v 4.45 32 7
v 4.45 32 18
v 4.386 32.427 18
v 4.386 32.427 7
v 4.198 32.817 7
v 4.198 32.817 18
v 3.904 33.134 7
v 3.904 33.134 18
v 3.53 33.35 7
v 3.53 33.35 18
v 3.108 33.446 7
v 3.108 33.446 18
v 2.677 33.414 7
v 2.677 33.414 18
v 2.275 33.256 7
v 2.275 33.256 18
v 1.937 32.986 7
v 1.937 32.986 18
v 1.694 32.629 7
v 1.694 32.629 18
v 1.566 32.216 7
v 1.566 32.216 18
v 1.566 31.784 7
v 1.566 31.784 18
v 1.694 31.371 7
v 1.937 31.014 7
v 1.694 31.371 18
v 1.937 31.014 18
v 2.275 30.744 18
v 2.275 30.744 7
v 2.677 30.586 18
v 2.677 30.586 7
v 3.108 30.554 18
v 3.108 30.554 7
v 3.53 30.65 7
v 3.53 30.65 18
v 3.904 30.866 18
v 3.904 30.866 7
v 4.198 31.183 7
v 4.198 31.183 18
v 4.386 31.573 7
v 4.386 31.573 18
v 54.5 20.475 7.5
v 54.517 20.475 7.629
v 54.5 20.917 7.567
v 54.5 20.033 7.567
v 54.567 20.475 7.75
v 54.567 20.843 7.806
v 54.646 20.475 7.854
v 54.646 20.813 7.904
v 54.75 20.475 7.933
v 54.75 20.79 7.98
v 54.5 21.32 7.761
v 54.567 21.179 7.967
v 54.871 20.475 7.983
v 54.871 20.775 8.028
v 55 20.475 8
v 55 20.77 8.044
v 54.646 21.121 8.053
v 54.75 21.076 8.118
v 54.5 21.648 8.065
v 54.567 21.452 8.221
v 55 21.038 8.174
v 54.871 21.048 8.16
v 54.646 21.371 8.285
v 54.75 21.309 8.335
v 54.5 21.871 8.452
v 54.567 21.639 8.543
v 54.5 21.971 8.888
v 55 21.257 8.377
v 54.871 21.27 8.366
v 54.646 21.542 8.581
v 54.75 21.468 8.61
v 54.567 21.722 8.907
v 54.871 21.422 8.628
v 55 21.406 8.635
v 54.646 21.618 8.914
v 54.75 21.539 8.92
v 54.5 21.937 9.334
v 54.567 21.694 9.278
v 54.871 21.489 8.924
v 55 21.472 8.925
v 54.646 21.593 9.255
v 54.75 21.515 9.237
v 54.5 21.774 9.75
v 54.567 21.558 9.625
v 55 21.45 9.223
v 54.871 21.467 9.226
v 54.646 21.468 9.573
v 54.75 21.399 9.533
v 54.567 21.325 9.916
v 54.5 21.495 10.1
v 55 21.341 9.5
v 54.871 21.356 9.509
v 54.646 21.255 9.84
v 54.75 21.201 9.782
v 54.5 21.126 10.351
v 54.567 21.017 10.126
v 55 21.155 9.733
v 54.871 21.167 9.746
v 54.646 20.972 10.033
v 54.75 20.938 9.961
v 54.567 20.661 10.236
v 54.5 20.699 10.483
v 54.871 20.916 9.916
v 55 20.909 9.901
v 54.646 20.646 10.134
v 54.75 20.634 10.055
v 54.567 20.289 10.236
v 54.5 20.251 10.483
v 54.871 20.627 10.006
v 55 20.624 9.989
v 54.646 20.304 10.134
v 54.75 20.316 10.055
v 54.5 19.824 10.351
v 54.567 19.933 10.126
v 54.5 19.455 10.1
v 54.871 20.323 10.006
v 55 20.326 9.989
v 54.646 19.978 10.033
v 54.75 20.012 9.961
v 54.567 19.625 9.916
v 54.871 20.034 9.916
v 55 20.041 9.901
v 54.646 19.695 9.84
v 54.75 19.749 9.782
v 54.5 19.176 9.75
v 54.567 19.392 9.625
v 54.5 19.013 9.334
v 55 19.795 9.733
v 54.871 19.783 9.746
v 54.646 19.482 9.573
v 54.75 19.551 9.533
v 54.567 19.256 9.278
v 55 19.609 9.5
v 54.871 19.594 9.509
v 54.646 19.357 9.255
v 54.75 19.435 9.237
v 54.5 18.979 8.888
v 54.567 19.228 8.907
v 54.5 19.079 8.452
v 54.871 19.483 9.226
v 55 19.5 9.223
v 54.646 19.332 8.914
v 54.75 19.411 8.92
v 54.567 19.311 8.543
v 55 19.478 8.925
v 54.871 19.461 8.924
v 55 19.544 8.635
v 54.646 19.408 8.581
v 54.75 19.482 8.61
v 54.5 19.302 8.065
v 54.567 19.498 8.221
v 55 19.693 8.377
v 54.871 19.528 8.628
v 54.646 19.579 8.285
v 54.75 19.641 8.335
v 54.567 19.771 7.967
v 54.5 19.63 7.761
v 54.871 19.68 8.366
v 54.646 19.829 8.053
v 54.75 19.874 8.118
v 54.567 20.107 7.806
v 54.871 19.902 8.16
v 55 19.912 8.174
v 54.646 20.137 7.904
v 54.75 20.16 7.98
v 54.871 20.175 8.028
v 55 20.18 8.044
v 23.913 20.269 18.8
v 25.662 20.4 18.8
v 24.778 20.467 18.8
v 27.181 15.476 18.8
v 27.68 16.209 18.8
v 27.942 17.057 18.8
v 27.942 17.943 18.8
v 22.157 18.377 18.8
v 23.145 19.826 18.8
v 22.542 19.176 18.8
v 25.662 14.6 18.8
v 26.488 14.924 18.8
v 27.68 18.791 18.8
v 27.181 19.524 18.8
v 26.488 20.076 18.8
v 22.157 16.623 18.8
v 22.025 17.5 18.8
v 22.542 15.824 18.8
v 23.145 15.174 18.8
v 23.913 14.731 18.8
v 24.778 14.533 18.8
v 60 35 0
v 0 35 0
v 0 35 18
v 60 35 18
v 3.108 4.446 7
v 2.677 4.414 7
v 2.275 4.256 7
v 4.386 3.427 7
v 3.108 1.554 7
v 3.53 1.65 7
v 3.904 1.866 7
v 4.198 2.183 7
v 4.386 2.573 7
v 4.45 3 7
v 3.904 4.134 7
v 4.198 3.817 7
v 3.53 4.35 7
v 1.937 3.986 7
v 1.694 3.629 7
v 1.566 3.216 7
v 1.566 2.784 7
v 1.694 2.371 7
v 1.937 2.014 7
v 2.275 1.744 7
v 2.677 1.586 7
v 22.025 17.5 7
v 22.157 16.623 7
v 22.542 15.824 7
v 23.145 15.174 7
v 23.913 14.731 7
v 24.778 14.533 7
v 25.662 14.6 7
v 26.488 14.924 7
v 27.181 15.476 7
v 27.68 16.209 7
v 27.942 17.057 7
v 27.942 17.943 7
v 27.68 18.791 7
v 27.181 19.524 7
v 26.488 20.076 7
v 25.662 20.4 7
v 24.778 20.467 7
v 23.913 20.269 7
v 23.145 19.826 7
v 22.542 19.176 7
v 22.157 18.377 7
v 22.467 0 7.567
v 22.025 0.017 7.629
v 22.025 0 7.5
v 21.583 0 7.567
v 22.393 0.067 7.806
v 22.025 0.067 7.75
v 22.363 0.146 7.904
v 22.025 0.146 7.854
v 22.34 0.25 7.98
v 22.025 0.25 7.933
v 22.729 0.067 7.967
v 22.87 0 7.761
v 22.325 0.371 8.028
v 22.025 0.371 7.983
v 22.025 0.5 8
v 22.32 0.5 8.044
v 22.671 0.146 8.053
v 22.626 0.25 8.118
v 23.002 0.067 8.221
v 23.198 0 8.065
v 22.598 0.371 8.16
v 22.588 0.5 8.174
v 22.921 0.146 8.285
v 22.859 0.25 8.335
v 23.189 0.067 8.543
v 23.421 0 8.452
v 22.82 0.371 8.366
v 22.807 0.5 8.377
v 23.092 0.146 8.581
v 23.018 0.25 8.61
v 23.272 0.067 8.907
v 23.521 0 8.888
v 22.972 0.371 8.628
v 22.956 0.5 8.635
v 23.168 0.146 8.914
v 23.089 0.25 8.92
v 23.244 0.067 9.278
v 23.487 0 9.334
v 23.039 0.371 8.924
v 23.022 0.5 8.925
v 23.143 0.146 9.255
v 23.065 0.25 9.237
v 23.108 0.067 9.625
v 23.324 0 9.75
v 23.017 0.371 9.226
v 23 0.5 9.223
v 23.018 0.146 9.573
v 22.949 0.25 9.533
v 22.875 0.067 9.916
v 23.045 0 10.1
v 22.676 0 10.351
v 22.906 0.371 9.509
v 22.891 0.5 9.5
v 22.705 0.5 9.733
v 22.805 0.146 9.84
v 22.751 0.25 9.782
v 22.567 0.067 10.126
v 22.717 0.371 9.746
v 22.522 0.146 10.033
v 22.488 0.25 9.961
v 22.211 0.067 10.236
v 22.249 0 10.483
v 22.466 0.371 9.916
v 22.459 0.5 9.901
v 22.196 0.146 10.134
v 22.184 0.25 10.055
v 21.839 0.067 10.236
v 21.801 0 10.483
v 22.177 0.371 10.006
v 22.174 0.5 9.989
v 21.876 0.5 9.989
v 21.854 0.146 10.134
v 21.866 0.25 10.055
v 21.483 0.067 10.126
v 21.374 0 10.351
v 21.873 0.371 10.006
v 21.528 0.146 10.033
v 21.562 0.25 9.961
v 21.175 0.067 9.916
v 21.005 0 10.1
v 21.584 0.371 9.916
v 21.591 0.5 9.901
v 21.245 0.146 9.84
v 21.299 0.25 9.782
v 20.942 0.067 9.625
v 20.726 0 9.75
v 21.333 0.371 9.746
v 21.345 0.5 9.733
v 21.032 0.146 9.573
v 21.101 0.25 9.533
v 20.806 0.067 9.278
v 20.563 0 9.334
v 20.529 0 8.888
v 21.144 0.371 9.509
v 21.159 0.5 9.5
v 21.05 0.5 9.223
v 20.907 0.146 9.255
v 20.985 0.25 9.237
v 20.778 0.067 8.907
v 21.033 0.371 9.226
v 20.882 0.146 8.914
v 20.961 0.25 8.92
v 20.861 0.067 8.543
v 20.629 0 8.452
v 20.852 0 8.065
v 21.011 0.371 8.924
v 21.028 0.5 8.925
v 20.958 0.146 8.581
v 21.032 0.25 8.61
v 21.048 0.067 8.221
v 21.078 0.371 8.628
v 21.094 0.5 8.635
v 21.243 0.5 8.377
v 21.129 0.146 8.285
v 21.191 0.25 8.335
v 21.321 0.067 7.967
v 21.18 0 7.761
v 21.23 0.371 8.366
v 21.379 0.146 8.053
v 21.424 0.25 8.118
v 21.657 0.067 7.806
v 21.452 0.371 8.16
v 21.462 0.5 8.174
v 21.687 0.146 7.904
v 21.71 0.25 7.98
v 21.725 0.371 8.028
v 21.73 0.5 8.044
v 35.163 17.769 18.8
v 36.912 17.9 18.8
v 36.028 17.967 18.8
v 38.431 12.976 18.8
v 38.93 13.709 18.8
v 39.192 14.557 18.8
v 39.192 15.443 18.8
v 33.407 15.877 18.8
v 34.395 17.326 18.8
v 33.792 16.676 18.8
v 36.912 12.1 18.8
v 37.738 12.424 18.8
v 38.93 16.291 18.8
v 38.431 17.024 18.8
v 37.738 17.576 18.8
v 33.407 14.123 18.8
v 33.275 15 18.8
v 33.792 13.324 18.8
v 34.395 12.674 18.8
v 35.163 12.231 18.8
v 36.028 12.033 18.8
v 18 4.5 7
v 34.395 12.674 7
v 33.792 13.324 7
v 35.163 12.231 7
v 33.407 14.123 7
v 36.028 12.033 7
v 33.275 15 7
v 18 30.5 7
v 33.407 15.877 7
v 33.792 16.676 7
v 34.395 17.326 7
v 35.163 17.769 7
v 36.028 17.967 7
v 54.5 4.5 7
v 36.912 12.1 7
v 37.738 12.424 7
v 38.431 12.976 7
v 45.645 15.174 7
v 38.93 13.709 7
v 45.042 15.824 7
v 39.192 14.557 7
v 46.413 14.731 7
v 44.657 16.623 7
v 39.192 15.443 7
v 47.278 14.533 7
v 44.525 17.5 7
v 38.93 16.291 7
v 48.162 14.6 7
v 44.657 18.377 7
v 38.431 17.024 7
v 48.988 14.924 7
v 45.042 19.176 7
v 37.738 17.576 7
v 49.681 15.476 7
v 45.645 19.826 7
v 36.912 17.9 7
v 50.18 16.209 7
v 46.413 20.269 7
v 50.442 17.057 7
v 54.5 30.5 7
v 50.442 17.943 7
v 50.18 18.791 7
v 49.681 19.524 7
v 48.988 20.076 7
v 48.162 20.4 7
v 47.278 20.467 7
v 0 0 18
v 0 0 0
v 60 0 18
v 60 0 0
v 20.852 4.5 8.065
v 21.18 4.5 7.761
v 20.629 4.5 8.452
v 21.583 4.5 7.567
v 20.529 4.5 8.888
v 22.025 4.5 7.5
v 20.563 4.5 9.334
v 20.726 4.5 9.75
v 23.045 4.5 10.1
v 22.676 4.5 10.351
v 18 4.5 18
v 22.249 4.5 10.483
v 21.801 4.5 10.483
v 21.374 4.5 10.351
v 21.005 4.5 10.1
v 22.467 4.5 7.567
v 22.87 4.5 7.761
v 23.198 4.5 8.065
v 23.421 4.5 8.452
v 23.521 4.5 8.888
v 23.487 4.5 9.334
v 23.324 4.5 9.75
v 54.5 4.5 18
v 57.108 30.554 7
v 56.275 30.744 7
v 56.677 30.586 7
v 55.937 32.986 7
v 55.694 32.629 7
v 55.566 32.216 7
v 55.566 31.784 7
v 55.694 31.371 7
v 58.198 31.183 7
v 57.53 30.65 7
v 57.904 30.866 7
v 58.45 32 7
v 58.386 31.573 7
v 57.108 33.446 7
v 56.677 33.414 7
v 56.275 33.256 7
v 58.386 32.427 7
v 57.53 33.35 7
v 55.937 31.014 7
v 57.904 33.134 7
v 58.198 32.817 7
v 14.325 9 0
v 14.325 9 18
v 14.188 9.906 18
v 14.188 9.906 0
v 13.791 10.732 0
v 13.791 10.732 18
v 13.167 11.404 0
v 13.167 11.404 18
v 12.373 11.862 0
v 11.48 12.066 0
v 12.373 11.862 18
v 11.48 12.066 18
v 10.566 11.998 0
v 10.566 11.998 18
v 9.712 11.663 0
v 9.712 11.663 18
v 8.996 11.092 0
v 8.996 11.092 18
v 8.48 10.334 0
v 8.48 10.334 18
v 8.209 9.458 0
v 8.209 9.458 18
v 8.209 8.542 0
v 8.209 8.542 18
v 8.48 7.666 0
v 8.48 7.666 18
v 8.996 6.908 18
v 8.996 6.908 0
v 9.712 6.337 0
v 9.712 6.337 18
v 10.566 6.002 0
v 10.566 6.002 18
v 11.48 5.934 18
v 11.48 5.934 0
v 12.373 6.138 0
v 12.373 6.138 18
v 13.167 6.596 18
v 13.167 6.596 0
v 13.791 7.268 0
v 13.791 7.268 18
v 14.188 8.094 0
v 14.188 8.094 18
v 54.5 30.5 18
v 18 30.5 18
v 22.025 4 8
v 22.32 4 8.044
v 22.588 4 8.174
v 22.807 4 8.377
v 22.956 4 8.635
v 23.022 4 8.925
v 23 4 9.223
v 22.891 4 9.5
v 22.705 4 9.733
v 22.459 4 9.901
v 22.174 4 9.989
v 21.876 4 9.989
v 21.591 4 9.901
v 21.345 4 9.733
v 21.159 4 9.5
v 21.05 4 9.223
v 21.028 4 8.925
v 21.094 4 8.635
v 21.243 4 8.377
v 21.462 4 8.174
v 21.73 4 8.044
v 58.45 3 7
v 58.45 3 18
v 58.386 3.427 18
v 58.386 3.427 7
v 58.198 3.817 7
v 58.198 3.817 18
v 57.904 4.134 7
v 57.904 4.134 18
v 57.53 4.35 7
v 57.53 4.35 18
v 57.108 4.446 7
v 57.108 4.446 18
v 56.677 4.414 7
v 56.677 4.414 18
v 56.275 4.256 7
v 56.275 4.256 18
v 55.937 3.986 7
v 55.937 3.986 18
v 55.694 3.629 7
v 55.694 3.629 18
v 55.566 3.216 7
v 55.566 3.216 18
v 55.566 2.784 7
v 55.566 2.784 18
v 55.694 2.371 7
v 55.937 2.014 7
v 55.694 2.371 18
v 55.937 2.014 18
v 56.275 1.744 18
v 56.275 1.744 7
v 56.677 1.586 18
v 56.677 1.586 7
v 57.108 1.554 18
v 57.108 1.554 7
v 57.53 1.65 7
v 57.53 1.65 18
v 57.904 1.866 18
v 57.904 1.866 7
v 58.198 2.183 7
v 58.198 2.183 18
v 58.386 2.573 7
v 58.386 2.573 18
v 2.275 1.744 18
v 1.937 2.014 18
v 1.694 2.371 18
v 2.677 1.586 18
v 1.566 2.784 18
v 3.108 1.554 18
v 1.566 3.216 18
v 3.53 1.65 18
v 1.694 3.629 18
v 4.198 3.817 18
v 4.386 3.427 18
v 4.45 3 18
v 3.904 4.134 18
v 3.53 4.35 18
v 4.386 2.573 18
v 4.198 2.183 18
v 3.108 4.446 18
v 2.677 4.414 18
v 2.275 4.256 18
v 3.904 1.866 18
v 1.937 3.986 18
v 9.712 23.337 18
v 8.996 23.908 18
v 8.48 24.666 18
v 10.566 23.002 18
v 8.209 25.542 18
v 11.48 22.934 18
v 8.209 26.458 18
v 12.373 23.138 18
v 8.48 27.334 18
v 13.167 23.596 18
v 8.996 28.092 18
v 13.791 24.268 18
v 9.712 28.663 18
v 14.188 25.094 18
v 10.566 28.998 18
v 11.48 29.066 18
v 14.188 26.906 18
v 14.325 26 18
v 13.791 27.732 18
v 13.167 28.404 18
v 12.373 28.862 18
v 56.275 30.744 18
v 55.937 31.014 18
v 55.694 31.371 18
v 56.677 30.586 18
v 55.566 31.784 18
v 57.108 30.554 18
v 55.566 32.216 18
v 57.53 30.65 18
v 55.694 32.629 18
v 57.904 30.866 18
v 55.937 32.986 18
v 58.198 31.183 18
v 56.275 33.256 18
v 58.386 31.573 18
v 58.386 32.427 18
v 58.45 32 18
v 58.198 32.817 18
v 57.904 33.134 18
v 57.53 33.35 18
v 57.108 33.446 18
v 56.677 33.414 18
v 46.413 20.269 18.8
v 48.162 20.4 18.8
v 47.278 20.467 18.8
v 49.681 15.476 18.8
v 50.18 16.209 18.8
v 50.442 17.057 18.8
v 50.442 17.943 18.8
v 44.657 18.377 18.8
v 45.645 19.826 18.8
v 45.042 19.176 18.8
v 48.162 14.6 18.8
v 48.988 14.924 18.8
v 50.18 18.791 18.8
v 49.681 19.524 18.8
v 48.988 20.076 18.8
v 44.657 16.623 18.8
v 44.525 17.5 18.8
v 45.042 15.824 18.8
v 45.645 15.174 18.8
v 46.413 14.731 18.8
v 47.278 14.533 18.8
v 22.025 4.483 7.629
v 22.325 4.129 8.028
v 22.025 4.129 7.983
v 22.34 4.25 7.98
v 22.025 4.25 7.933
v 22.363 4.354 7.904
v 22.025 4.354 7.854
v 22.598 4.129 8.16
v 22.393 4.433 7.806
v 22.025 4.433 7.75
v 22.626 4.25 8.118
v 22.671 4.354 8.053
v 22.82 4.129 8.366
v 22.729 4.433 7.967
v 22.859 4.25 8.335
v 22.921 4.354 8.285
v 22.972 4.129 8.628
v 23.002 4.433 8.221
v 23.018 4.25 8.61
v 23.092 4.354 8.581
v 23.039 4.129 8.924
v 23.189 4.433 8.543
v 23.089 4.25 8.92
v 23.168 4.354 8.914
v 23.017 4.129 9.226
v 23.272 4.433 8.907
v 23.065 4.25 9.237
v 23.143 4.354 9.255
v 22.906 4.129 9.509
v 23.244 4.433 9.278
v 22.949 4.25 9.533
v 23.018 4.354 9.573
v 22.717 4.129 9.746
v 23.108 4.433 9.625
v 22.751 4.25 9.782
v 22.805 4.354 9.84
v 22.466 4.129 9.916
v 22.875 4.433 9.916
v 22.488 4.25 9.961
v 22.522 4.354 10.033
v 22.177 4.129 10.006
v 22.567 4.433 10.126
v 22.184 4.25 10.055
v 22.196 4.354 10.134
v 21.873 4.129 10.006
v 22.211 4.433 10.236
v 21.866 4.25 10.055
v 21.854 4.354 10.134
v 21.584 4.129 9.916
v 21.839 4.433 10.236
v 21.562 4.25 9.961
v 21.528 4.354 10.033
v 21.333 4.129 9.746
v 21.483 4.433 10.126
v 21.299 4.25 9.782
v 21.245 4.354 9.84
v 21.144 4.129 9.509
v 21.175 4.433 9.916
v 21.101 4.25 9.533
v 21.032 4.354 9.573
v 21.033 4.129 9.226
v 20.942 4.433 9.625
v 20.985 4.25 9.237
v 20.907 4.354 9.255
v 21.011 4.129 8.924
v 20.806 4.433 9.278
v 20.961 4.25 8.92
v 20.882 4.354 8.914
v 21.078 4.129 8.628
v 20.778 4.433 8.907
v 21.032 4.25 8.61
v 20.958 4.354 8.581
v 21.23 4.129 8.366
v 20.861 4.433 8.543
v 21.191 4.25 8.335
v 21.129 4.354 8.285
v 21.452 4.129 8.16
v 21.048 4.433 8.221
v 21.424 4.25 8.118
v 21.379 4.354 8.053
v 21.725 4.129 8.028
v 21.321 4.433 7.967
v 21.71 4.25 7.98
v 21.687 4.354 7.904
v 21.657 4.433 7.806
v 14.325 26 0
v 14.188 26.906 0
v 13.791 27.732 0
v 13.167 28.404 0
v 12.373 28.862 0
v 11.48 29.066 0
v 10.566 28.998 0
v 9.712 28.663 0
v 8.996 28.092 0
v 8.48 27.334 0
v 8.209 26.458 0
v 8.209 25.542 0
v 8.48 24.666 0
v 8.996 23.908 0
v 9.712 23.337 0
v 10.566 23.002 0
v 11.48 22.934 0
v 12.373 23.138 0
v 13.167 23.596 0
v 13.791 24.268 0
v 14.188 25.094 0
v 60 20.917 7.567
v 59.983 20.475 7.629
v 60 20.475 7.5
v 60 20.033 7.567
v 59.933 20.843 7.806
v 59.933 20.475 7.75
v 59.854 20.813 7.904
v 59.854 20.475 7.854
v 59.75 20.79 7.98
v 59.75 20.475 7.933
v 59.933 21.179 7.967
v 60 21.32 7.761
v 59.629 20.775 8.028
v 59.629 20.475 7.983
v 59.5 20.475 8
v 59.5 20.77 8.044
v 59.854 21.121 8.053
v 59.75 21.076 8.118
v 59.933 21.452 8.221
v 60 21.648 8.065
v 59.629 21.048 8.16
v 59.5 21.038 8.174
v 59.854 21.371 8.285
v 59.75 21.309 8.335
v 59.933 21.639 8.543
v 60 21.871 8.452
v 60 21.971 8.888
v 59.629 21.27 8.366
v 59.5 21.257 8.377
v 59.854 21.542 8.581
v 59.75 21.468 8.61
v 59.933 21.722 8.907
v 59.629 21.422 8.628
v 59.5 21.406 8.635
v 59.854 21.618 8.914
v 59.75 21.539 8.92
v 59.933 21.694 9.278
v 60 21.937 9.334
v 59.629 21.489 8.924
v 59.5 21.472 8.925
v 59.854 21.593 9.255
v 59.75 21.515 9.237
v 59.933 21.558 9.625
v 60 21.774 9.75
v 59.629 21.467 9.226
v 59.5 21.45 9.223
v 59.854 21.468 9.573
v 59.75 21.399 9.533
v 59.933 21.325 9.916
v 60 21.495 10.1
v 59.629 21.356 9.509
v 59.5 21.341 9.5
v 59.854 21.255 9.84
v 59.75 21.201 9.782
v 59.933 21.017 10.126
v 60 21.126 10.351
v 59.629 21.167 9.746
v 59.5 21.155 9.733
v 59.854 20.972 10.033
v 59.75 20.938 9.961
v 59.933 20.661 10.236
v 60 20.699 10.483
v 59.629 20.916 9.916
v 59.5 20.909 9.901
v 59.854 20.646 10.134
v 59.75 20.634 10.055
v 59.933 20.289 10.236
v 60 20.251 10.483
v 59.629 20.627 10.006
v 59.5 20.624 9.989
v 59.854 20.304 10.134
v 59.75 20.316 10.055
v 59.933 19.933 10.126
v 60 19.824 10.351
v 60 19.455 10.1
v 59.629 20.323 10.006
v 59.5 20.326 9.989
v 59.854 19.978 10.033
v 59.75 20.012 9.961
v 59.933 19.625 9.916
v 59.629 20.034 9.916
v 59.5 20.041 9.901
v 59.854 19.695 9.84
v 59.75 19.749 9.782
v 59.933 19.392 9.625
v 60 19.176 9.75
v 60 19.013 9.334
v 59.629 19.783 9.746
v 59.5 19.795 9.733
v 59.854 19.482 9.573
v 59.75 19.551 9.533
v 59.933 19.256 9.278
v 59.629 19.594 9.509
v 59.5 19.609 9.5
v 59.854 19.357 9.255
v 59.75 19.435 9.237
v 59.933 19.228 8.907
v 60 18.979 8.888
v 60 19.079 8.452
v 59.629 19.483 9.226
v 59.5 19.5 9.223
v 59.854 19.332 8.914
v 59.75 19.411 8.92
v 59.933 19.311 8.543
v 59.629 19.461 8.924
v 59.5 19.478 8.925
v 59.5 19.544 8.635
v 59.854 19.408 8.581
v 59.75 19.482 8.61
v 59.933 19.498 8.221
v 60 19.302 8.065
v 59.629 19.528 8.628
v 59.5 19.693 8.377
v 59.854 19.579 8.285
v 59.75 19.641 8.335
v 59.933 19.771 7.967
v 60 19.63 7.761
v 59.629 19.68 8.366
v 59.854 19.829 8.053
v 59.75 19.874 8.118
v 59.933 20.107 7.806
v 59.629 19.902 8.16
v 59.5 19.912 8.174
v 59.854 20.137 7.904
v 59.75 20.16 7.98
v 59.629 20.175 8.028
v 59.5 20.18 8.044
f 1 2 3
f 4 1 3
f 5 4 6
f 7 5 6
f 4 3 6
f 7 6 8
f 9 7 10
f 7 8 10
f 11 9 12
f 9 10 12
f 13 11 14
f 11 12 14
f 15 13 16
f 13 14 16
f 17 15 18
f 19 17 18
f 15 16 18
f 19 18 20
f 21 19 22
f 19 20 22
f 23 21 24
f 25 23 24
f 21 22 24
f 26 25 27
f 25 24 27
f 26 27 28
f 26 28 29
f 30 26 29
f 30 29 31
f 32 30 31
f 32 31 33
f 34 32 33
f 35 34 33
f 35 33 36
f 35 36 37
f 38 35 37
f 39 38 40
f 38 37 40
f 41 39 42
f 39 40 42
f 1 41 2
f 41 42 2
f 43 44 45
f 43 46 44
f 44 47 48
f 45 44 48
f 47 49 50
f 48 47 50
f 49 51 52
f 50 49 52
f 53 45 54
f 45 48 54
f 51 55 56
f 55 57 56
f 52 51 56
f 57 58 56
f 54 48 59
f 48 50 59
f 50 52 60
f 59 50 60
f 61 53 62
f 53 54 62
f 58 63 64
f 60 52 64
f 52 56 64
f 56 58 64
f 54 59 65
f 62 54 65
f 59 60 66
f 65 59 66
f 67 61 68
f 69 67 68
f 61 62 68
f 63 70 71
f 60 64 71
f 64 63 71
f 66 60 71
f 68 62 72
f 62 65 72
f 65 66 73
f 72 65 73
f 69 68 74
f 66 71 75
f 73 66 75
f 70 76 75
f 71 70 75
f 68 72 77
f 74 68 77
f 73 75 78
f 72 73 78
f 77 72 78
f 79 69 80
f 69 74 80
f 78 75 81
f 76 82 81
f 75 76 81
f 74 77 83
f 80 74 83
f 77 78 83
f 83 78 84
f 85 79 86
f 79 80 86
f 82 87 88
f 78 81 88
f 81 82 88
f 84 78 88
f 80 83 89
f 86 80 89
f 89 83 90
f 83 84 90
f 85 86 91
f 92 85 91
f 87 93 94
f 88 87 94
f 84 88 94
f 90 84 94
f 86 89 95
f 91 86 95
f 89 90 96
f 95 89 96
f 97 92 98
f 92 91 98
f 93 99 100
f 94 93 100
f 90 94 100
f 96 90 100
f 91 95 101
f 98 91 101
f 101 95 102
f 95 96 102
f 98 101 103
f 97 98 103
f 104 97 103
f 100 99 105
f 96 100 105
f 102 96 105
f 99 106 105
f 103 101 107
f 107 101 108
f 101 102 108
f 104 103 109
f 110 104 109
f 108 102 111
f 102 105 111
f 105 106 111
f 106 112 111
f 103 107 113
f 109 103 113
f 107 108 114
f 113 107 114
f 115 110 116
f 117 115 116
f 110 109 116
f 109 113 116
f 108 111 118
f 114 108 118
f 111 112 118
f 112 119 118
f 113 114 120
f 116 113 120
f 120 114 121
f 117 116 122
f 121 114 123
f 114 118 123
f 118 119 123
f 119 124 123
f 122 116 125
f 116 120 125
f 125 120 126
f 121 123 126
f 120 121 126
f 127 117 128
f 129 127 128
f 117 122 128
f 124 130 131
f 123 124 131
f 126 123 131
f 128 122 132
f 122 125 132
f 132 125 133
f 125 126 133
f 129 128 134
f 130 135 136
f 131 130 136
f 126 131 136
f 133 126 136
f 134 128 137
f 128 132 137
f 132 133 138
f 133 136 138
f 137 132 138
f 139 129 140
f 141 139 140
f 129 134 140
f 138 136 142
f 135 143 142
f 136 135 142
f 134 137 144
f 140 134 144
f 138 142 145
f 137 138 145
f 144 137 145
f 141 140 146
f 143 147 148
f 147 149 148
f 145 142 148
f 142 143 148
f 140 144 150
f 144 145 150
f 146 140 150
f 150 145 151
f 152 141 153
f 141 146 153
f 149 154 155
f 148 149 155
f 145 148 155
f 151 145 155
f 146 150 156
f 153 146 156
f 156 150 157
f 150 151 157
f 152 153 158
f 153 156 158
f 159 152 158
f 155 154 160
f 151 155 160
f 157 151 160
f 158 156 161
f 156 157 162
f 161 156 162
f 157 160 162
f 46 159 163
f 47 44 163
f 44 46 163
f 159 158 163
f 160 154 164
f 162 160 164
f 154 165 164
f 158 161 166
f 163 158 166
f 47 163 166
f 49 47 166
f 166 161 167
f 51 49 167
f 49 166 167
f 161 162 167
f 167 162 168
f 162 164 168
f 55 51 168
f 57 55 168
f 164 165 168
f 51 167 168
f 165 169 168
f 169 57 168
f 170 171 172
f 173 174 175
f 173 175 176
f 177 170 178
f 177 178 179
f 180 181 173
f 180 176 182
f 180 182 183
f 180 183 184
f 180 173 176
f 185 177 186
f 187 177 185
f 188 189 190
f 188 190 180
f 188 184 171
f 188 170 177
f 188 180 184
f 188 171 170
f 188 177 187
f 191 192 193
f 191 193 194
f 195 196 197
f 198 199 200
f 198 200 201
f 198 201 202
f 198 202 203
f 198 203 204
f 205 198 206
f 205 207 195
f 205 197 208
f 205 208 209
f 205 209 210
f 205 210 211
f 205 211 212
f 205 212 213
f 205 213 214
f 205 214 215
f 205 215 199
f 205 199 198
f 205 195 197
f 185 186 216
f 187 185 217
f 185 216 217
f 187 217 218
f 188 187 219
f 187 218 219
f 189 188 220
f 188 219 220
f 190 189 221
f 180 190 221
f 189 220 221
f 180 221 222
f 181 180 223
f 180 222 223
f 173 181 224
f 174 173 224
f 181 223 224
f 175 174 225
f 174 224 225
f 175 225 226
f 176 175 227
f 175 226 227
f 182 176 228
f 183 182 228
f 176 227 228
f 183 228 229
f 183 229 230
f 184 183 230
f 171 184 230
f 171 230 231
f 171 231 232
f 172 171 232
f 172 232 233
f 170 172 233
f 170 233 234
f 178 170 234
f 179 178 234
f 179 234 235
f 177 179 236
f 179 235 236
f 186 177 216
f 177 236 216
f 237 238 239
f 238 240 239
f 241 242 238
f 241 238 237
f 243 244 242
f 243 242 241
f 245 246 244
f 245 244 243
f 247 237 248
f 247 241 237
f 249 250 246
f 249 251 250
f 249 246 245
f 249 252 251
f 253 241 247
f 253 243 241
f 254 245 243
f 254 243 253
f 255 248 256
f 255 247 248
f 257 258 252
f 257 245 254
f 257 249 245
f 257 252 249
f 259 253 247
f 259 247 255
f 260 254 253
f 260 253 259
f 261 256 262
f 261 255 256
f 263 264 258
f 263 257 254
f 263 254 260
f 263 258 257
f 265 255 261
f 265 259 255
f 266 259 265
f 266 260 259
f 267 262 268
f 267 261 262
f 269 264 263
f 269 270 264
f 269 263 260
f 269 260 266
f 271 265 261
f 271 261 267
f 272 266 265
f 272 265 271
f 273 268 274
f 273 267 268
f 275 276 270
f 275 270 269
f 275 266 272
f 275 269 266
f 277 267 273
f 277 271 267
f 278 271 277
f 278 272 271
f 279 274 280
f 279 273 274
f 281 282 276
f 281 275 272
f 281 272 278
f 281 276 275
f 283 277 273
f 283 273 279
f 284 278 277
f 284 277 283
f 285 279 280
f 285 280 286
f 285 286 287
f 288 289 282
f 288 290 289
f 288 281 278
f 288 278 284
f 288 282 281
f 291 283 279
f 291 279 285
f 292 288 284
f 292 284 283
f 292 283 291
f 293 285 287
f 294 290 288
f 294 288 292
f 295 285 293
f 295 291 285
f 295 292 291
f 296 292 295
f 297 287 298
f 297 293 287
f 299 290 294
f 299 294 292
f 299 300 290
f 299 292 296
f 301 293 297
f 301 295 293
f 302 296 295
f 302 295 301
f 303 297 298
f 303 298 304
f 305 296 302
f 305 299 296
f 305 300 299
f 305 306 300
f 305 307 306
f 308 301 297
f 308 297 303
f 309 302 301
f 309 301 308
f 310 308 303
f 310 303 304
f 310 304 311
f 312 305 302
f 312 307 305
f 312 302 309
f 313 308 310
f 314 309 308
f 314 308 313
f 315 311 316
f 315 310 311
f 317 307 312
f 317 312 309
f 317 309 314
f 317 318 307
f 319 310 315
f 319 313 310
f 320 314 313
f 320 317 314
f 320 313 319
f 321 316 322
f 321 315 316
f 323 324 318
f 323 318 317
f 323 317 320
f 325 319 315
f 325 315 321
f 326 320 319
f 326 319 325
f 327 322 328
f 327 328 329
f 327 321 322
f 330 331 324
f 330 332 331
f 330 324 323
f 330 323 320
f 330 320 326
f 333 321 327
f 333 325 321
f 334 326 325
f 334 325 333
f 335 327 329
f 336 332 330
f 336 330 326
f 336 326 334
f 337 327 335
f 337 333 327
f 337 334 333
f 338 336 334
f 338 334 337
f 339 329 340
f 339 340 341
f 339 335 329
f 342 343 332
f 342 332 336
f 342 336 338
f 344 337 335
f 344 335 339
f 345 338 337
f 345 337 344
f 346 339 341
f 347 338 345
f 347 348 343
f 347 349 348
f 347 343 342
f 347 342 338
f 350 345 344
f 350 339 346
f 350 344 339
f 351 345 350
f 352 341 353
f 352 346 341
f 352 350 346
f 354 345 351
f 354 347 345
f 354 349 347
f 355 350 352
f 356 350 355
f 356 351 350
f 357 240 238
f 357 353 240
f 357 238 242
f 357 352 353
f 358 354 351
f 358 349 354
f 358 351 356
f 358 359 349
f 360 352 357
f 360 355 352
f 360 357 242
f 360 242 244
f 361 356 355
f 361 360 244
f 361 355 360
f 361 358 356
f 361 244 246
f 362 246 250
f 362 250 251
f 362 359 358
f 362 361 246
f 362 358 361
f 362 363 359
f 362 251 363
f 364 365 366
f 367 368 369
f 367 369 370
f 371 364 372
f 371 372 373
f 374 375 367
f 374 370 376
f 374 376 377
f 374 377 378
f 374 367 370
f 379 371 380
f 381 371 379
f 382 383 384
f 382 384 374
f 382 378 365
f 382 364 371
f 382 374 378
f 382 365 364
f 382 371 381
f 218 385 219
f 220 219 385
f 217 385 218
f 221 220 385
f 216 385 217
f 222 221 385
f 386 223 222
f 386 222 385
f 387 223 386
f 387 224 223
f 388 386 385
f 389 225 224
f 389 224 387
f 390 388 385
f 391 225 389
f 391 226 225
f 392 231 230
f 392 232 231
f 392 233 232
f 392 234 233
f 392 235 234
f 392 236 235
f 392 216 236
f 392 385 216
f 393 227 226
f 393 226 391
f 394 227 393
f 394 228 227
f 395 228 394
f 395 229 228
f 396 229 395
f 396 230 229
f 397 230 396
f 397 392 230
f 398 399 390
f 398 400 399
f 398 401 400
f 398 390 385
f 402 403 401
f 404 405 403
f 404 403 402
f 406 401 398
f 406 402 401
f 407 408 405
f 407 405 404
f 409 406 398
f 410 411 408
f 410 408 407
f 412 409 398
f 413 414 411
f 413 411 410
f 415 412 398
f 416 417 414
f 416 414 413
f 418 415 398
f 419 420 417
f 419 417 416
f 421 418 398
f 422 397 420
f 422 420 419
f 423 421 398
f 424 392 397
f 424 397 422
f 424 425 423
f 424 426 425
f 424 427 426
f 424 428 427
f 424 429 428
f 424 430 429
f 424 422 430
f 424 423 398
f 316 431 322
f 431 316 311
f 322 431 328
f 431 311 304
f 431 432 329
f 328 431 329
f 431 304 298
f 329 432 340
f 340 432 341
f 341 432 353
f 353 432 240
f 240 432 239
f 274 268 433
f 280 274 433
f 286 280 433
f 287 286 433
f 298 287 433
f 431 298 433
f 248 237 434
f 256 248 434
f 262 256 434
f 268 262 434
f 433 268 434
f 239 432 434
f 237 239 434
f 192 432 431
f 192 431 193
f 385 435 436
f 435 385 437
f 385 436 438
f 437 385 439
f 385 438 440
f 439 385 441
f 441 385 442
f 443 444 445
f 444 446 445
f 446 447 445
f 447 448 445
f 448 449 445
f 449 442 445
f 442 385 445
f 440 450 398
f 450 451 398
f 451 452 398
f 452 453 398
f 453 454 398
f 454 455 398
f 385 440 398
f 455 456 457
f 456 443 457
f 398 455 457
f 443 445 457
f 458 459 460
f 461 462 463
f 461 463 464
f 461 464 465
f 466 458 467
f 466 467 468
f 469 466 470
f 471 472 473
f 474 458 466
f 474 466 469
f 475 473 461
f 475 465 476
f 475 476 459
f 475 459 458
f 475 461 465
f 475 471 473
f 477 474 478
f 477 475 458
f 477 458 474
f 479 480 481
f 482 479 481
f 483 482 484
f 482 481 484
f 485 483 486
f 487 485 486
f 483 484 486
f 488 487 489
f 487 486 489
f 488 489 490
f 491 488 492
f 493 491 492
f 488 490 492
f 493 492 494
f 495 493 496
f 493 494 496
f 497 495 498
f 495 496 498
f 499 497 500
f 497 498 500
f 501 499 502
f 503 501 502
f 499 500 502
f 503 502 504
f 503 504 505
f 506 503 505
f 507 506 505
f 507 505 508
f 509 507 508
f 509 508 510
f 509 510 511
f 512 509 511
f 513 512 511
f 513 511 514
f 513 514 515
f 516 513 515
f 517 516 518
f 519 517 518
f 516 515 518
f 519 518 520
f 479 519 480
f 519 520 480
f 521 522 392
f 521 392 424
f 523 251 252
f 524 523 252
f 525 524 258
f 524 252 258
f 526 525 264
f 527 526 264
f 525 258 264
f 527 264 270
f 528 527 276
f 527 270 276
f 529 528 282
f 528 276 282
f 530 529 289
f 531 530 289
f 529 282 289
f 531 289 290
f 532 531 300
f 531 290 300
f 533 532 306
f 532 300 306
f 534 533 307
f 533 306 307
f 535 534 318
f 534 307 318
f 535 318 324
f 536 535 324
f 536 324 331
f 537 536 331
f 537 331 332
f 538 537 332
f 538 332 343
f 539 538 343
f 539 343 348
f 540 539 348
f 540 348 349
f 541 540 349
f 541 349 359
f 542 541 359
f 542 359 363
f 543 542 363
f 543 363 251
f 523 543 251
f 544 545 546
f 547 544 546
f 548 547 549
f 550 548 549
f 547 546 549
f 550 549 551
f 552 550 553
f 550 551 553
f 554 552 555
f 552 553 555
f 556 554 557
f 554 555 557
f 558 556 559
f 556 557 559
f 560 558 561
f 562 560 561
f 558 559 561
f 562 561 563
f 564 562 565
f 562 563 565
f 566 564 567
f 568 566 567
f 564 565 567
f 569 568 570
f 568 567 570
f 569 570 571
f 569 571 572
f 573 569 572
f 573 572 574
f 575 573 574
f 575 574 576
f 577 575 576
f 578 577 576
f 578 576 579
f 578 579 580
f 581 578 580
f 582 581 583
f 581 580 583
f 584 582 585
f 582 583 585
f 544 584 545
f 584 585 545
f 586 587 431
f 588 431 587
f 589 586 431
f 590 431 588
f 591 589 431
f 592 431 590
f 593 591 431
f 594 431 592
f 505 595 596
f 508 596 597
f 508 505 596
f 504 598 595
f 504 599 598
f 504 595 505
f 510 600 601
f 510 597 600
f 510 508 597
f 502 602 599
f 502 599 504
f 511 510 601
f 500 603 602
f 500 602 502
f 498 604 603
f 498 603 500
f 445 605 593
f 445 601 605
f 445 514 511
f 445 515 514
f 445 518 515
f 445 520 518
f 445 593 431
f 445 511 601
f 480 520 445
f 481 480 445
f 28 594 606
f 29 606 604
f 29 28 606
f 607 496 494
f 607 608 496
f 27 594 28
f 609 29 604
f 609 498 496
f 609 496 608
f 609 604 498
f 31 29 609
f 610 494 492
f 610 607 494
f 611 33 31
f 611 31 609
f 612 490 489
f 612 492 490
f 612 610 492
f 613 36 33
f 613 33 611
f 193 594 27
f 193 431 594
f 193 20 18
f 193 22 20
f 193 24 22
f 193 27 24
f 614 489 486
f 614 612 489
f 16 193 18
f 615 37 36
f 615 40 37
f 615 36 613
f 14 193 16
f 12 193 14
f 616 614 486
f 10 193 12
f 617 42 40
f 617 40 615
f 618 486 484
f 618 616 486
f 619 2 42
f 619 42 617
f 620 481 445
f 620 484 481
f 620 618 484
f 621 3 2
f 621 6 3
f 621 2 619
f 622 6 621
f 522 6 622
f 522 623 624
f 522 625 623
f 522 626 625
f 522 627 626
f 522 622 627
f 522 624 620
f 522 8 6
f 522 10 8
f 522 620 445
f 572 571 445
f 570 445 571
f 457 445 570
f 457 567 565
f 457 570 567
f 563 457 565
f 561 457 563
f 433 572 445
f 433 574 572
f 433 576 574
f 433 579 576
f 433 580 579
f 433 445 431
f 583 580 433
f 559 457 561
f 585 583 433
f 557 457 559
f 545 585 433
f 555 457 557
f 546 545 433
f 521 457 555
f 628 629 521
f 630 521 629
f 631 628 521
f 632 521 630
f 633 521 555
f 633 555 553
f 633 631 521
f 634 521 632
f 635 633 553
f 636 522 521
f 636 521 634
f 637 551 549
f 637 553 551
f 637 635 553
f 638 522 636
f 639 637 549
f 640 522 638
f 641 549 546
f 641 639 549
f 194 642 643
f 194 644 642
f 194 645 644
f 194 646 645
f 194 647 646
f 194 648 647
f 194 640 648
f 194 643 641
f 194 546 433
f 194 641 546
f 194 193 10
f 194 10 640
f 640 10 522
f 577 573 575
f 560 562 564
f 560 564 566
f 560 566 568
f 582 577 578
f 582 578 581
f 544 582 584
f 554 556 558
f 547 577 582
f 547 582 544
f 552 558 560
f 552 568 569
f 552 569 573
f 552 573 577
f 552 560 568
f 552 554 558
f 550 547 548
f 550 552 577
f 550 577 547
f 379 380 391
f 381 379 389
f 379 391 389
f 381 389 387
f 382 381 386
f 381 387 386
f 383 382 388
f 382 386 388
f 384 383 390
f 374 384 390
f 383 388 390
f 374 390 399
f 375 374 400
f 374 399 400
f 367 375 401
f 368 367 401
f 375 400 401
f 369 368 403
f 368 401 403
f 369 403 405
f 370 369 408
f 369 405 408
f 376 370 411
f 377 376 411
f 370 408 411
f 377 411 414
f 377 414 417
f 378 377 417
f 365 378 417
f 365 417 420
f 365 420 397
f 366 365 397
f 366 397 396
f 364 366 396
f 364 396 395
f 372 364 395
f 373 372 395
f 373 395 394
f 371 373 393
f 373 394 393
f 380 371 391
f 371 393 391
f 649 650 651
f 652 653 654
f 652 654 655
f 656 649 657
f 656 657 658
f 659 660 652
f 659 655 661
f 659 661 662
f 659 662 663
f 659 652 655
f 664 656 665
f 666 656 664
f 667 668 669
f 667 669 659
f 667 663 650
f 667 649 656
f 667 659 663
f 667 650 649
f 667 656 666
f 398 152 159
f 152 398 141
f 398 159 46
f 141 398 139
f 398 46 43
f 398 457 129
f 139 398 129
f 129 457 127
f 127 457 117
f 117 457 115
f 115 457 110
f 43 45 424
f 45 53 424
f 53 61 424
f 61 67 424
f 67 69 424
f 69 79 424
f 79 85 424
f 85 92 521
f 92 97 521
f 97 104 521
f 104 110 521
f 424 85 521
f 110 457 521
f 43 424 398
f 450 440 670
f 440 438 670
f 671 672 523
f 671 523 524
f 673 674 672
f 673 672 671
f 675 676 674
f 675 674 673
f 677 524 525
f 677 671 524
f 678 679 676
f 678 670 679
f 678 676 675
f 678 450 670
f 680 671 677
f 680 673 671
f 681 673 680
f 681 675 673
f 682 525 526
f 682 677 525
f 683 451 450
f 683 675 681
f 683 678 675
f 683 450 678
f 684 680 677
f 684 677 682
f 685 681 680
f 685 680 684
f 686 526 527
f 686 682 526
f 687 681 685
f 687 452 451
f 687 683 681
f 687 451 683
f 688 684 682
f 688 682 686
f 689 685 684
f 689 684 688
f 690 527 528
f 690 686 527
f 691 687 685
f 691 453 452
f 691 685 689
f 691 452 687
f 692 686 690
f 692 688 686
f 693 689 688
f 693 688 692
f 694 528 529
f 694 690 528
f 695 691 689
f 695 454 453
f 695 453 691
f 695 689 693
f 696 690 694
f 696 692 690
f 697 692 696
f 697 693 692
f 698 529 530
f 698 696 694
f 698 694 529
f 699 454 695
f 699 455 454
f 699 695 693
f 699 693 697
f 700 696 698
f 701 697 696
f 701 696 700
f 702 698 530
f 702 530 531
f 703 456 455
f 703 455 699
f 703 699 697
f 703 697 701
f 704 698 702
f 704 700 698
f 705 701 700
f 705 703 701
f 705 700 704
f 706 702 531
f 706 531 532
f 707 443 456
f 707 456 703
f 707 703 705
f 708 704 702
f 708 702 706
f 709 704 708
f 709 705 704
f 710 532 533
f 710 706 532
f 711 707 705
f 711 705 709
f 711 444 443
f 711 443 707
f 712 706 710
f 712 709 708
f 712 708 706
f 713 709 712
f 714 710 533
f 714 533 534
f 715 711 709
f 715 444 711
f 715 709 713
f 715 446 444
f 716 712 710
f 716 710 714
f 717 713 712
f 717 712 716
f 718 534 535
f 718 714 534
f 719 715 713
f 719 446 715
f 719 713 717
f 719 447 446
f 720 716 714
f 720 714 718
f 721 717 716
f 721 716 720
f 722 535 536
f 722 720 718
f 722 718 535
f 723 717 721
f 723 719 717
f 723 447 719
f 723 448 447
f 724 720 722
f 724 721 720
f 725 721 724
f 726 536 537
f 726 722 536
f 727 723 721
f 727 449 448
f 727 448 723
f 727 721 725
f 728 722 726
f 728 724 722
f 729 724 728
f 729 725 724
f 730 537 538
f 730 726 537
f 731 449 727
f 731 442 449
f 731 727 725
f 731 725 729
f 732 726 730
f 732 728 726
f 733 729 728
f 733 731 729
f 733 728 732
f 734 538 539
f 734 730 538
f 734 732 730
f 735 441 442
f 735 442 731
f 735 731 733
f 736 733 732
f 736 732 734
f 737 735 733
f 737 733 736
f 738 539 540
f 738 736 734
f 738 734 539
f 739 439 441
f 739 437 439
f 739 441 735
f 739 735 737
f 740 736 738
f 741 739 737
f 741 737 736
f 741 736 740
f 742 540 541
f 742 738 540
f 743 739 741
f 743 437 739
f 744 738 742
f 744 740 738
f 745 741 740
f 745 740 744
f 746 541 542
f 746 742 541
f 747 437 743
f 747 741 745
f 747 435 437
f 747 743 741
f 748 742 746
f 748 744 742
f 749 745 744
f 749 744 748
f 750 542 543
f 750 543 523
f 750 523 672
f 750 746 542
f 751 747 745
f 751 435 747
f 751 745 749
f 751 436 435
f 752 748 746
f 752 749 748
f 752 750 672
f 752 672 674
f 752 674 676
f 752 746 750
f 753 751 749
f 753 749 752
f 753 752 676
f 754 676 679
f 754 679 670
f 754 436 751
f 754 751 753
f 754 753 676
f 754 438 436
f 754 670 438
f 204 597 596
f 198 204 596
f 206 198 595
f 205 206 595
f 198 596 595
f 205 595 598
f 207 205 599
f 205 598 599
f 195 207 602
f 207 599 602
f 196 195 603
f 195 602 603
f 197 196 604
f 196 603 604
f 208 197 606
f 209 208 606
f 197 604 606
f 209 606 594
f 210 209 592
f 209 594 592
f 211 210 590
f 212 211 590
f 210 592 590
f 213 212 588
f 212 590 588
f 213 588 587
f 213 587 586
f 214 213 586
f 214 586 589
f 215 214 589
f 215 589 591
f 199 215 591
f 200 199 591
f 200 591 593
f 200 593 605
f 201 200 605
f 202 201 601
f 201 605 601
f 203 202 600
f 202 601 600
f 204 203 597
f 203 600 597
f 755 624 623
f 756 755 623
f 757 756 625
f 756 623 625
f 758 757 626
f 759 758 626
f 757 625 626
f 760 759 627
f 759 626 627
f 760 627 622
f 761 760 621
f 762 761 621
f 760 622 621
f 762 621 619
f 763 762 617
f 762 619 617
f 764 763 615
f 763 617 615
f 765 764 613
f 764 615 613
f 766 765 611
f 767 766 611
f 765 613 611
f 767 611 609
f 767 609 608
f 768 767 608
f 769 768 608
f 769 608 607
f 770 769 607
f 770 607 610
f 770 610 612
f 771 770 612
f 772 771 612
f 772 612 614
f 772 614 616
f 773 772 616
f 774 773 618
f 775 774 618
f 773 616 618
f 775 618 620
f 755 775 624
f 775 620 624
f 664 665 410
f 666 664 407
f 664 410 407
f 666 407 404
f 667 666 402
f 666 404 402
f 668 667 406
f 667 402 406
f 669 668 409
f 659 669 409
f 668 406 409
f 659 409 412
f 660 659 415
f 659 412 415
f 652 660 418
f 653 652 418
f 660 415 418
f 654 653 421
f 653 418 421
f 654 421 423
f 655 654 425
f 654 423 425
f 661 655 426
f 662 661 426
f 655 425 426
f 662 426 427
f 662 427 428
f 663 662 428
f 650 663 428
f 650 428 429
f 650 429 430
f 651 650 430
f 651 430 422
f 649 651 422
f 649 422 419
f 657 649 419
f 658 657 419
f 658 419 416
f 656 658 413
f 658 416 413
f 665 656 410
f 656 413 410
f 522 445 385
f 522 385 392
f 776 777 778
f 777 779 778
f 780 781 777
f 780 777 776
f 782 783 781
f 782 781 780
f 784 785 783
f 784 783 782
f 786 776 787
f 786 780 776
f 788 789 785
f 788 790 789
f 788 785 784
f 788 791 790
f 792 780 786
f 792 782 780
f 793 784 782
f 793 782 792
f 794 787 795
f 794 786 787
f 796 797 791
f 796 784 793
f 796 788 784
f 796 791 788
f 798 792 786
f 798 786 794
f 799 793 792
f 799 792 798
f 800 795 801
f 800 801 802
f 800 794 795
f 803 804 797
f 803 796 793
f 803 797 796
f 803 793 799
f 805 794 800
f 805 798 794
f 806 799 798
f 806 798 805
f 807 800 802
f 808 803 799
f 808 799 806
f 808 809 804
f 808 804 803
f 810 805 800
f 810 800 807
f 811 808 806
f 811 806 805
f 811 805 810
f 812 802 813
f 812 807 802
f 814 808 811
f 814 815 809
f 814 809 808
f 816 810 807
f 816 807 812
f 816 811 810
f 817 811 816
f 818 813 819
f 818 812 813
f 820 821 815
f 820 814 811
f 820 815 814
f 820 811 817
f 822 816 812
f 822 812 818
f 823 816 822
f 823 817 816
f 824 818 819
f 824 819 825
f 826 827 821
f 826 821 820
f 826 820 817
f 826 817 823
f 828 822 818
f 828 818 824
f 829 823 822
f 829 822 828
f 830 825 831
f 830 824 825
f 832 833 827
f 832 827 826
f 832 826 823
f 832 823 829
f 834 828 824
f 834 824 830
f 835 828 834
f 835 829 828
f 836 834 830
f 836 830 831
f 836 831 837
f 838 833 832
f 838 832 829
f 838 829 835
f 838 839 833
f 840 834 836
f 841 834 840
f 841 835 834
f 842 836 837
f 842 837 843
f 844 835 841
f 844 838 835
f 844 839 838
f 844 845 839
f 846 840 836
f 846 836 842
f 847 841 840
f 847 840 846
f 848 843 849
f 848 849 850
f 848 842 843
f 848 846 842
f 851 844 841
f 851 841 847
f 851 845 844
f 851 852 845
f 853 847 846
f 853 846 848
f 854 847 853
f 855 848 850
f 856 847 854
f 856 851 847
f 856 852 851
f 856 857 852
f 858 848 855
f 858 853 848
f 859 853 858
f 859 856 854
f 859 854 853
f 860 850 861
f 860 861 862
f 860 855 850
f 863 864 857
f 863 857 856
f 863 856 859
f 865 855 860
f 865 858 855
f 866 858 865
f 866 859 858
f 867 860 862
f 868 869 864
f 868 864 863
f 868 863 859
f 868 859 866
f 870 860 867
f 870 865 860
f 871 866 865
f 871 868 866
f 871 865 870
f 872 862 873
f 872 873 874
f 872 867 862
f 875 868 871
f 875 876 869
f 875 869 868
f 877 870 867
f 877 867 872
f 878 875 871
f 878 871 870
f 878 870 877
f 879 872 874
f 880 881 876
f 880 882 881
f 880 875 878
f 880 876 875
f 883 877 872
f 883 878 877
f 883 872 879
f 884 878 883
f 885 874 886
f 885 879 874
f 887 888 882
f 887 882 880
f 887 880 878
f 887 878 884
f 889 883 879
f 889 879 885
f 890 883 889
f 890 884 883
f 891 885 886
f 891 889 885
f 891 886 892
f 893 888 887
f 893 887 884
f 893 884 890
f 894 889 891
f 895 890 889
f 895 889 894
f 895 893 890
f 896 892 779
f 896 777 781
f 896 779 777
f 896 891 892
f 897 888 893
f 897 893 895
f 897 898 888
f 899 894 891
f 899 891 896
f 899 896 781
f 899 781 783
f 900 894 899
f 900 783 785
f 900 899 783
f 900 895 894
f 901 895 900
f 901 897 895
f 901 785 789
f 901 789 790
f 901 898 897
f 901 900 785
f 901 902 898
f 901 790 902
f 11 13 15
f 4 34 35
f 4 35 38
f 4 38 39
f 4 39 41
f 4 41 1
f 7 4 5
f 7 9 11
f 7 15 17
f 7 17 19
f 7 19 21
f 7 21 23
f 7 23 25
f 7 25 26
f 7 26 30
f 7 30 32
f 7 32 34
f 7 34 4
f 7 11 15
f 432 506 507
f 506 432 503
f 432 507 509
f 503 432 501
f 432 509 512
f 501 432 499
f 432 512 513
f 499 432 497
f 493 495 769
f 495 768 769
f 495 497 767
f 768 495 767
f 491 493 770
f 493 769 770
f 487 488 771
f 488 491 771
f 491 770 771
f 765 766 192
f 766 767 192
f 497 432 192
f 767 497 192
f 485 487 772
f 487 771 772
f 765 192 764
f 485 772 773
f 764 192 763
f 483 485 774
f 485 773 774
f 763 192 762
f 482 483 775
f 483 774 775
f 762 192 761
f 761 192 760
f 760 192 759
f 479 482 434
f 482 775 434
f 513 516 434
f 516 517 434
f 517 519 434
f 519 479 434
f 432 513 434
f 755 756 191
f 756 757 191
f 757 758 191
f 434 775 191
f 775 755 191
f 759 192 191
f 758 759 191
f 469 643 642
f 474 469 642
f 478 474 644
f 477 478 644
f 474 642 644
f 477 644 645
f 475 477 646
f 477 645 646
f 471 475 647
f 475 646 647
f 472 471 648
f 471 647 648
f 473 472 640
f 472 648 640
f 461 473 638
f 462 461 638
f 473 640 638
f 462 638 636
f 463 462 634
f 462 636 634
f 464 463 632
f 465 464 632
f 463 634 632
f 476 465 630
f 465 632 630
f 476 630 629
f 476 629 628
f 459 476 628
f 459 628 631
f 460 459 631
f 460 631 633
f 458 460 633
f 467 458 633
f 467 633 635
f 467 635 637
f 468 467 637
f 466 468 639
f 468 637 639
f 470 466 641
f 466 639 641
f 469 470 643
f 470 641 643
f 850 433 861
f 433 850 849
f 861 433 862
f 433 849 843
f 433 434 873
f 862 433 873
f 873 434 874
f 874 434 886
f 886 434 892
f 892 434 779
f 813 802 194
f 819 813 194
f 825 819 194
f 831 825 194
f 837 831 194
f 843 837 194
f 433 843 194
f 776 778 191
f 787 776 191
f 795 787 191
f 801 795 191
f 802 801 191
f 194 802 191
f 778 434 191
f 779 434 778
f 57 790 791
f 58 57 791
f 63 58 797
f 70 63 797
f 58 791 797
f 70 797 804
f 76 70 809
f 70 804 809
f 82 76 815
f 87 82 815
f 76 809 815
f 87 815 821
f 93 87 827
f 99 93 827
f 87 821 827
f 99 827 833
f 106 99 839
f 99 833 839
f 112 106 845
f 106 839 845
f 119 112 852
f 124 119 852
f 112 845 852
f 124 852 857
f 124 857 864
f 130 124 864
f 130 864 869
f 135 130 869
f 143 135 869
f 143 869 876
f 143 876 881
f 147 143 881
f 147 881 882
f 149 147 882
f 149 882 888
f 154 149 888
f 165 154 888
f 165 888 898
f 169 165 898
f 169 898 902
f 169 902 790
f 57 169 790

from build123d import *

# Parameters (mm, degrees)
SKETCH1_W           = 60
SKETCH1_H           = 35
BOSS_EXTRUDE1_DEPTH = 18
SKETCH2_R           = 3.075
CUT_EXTRUDE1_DEPTH  = 18
SKETCH3_R           = 1.45
SKETCH3_W           = 36.5
SKETCH3_H           = 26
CUT_EXTRUDE2_DEPTH  = 11
SKETCH4_R           = 2.975
BOSS_EXTRUDE2_DEPTH = 11.8
SKETCH6_R           = 1
CUT_EXTRUDE3_DEPTH  = 5.8
SKETCH8_R           = 1
CUT_EXTRUDE4_DEPTH  = 5.8
FILLET2_R           = 0.5


with BuildPart() as part:
    # Sketch1 → Boss-Extrude1 (new body)
    with BuildSketch(Plane.XY):
        with Locations((30, 17.5)):
            Rectangle(SKETCH1_W, SKETCH1_H)
    extrude(amount=BOSS_EXTRUDE1_DEPTH)

    # Sketch2 → Cut-Extrude1 (cut)
    with BuildSketch(Plane.XY.offset(18)):
        with Locations((11.25, 26)):
            Circle(SKETCH2_R)
        with Locations((11.25, 9)):
            Circle(SKETCH2_R)
    extrude(amount=-CUT_EXTRUDE1_DEPTH, mode=Mode.SUBTRACT)

    # Sketch3 → Cut-Extrude2 (cut)
    with BuildSketch(Plane.XY.offset(18)):
        with Locations((3, 32)):
            Circle(SKETCH3_R)
        with Locations((57, 32)):
            Circle(SKETCH3_R)
        with Locations((57, 3)):
            Circle(SKETCH3_R)
        with Locations((3, 3)):
            Circle(SKETCH3_R)
        with Locations((36.25, 17.5)):
            Rectangle(SKETCH3_W, SKETCH3_H)
    extrude(amount=-CUT_EXTRUDE2_DEPTH, mode=Mode.SUBTRACT)

    # Sketch4 → Boss-Extrude2 (add)
    with BuildSketch(Plane.XY.offset(7)):
        with Locations(Location((25, 17.5, 0), (0, 0, 180))):
            Circle(SKETCH4_R)
        with Locations(Location((36.25, 15, 0), (0, 0, 180))):
            Circle(SKETCH4_R)
        with Locations(Location((47.5, 17.5, 0), (0, 0, 180))):
            Circle(SKETCH4_R)
    extrude(amount=BOSS_EXTRUDE2_DEPTH)

    # Sketch6 → Cut-Extrude3 (cut)
    with BuildSketch(Plane(origin=(60, 0, 0), x_dir=(0, 0, -1), z_dir=(1, 0, 0))):
        with Locations((-9, 20.475)):
            Circle(SKETCH6_R)
    extrude(amount=-CUT_EXTRUDE3_DEPTH, mode=Mode.SUBTRACT)

    # Sketch8 → Cut-Extrude4 (cut)
    with BuildSketch(Plane.XZ):
        with Locations(Location((22.025, 9, 0), (0, 0, 270))):
            Circle(SKETCH8_R)
    extrude(amount=-CUT_EXTRUDE4_DEPTH, mode=Mode.SUBTRACT)

    # Fillet2
    fillet2_edges = [part.edges().sort_by_distance(p)[0] for p in [
        (54.5, 20.475, 10),
        (60, 20.475, 10),
        (22.025, 4.5, 10),
        (22.025, 0, 10),
    ]]
    fillet(fillet2_edges, radius=FILLET2_R)


solid = part.part
